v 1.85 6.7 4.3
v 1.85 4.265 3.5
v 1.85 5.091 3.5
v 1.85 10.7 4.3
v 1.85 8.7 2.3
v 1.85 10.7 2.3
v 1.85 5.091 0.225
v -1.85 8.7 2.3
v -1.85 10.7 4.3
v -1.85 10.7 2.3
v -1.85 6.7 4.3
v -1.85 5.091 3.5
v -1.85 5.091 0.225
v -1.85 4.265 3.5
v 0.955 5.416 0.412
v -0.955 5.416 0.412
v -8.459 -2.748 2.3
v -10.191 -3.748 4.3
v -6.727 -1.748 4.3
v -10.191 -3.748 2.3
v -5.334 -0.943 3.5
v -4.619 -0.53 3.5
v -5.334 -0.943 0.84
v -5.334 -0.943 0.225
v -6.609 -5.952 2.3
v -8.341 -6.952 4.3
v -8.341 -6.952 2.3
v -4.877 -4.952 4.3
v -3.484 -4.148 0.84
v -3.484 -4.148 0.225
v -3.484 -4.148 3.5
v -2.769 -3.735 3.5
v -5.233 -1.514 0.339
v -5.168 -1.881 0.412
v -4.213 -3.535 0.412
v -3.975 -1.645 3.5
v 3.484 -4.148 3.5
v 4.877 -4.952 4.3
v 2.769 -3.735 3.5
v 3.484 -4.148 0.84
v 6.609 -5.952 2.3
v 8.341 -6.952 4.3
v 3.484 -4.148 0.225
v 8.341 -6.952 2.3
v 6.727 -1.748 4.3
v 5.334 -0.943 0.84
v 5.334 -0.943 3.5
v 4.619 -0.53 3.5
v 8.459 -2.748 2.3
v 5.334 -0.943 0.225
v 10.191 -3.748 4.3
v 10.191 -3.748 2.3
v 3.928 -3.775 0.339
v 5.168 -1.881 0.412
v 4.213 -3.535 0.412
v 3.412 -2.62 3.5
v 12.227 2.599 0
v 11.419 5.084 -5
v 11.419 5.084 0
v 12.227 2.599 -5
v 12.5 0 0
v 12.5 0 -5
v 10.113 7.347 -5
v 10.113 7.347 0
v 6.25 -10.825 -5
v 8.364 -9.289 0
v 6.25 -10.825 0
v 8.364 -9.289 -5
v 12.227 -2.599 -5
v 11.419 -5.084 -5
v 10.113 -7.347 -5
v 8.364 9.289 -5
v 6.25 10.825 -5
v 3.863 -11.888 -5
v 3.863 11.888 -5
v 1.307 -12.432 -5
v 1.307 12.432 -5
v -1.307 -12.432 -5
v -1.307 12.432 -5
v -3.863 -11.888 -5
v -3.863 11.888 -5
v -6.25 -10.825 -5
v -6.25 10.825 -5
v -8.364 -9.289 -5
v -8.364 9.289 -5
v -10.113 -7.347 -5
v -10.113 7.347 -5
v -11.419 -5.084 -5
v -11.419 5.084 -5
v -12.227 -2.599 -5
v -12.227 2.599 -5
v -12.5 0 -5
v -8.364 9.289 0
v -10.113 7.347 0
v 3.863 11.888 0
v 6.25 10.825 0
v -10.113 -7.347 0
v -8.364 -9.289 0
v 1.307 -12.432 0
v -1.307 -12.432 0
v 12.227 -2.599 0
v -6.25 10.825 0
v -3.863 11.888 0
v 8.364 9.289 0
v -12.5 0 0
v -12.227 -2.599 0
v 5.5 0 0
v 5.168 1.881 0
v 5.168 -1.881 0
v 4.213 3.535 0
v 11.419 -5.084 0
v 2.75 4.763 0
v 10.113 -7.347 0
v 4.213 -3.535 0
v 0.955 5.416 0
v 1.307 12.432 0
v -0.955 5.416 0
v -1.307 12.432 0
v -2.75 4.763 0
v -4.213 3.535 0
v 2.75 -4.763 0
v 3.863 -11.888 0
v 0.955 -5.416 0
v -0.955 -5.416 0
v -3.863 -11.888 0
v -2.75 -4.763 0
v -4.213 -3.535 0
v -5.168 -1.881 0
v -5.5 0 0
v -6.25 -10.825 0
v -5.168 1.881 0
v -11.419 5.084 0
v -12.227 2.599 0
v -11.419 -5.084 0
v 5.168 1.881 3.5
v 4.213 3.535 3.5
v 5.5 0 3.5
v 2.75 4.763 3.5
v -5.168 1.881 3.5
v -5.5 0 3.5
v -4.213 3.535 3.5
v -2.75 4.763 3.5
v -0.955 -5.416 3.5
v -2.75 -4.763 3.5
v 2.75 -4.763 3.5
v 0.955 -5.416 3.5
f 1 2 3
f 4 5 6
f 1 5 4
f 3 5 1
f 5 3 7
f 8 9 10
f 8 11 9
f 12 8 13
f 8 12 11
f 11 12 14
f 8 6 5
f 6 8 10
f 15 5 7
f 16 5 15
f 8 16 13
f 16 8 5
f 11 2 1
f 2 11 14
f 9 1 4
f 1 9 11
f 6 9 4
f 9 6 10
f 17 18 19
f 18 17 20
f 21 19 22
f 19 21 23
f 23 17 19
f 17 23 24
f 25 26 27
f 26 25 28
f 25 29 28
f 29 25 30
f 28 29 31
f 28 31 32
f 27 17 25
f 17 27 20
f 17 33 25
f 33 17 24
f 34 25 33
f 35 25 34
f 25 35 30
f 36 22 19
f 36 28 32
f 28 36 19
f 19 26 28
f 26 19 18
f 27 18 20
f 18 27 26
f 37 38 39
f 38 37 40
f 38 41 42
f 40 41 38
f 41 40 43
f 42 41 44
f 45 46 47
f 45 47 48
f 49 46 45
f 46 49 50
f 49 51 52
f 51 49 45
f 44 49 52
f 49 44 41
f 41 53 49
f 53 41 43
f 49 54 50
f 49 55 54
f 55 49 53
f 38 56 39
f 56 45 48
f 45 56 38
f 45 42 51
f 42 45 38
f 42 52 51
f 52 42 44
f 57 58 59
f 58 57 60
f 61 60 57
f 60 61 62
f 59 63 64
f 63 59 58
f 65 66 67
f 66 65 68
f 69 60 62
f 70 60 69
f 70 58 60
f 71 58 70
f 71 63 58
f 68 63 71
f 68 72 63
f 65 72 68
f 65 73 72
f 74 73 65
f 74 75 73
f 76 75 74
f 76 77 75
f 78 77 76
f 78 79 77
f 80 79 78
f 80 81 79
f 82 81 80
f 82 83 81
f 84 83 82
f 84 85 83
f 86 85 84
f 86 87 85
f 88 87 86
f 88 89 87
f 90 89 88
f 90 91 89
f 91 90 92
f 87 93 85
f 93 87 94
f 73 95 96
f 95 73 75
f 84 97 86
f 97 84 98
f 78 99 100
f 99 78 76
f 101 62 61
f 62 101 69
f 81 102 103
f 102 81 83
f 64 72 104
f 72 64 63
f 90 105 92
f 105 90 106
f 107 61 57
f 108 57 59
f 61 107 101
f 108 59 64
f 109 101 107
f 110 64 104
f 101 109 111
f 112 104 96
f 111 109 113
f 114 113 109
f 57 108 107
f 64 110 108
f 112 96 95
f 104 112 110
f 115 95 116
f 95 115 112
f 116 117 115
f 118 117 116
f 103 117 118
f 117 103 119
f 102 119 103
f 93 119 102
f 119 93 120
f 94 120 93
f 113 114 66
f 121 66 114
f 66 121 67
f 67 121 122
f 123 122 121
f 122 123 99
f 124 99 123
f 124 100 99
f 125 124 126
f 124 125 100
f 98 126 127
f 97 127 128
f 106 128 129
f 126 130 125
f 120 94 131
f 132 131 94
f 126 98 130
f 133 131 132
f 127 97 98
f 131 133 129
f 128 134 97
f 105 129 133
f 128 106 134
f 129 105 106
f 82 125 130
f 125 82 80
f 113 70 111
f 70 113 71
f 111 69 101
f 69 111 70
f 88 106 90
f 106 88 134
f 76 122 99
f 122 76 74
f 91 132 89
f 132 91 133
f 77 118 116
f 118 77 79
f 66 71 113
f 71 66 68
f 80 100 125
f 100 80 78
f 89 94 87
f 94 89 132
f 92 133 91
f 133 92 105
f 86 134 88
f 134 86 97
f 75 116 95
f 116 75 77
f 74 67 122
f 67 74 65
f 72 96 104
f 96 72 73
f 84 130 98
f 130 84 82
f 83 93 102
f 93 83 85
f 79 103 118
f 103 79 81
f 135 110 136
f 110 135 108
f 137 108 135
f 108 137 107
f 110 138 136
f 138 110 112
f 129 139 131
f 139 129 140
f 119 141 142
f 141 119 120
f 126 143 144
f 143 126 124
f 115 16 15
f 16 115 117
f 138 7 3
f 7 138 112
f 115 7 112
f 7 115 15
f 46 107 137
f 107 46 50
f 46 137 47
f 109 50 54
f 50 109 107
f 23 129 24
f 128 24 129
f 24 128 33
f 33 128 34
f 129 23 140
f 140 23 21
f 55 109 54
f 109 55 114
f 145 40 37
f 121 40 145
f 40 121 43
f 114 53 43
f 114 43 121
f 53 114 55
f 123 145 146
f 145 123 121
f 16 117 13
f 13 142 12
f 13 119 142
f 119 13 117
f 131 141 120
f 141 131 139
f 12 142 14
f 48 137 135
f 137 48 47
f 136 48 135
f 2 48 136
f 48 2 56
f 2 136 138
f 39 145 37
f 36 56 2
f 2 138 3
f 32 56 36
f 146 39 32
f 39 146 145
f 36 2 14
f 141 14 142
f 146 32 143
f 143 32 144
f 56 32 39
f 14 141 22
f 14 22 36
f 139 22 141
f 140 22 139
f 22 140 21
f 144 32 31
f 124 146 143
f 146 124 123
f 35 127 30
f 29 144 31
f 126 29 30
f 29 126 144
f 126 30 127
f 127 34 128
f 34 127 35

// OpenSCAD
module fin(tolerance=0.3) {


  union(){
    square(2);

    translate([0,2,0])
    hull() {
      square([2,2]);
      
      translate([2+tolerance,4,0])
      square([2,5]);
    }
  }
}

module finExtruded(){
  translate([3.7/2,10.7,4+.3])
  rotate([180,90,0])
  linear_extrude(height=3.7)
  fin();
}

module adaptor(tolerance=0.3) {
  union(){
    translate([0,0,-5])
    cylinder(r=25/2,h=5);
    
    translate([0,0,0])
    cylinder(r=11/2,h=3.5);
    
    for(i=[0:120:360]){
      rotate([0,0,i])
      finExtruded();
    }
  }
}

adaptor();
// finExtruded();
